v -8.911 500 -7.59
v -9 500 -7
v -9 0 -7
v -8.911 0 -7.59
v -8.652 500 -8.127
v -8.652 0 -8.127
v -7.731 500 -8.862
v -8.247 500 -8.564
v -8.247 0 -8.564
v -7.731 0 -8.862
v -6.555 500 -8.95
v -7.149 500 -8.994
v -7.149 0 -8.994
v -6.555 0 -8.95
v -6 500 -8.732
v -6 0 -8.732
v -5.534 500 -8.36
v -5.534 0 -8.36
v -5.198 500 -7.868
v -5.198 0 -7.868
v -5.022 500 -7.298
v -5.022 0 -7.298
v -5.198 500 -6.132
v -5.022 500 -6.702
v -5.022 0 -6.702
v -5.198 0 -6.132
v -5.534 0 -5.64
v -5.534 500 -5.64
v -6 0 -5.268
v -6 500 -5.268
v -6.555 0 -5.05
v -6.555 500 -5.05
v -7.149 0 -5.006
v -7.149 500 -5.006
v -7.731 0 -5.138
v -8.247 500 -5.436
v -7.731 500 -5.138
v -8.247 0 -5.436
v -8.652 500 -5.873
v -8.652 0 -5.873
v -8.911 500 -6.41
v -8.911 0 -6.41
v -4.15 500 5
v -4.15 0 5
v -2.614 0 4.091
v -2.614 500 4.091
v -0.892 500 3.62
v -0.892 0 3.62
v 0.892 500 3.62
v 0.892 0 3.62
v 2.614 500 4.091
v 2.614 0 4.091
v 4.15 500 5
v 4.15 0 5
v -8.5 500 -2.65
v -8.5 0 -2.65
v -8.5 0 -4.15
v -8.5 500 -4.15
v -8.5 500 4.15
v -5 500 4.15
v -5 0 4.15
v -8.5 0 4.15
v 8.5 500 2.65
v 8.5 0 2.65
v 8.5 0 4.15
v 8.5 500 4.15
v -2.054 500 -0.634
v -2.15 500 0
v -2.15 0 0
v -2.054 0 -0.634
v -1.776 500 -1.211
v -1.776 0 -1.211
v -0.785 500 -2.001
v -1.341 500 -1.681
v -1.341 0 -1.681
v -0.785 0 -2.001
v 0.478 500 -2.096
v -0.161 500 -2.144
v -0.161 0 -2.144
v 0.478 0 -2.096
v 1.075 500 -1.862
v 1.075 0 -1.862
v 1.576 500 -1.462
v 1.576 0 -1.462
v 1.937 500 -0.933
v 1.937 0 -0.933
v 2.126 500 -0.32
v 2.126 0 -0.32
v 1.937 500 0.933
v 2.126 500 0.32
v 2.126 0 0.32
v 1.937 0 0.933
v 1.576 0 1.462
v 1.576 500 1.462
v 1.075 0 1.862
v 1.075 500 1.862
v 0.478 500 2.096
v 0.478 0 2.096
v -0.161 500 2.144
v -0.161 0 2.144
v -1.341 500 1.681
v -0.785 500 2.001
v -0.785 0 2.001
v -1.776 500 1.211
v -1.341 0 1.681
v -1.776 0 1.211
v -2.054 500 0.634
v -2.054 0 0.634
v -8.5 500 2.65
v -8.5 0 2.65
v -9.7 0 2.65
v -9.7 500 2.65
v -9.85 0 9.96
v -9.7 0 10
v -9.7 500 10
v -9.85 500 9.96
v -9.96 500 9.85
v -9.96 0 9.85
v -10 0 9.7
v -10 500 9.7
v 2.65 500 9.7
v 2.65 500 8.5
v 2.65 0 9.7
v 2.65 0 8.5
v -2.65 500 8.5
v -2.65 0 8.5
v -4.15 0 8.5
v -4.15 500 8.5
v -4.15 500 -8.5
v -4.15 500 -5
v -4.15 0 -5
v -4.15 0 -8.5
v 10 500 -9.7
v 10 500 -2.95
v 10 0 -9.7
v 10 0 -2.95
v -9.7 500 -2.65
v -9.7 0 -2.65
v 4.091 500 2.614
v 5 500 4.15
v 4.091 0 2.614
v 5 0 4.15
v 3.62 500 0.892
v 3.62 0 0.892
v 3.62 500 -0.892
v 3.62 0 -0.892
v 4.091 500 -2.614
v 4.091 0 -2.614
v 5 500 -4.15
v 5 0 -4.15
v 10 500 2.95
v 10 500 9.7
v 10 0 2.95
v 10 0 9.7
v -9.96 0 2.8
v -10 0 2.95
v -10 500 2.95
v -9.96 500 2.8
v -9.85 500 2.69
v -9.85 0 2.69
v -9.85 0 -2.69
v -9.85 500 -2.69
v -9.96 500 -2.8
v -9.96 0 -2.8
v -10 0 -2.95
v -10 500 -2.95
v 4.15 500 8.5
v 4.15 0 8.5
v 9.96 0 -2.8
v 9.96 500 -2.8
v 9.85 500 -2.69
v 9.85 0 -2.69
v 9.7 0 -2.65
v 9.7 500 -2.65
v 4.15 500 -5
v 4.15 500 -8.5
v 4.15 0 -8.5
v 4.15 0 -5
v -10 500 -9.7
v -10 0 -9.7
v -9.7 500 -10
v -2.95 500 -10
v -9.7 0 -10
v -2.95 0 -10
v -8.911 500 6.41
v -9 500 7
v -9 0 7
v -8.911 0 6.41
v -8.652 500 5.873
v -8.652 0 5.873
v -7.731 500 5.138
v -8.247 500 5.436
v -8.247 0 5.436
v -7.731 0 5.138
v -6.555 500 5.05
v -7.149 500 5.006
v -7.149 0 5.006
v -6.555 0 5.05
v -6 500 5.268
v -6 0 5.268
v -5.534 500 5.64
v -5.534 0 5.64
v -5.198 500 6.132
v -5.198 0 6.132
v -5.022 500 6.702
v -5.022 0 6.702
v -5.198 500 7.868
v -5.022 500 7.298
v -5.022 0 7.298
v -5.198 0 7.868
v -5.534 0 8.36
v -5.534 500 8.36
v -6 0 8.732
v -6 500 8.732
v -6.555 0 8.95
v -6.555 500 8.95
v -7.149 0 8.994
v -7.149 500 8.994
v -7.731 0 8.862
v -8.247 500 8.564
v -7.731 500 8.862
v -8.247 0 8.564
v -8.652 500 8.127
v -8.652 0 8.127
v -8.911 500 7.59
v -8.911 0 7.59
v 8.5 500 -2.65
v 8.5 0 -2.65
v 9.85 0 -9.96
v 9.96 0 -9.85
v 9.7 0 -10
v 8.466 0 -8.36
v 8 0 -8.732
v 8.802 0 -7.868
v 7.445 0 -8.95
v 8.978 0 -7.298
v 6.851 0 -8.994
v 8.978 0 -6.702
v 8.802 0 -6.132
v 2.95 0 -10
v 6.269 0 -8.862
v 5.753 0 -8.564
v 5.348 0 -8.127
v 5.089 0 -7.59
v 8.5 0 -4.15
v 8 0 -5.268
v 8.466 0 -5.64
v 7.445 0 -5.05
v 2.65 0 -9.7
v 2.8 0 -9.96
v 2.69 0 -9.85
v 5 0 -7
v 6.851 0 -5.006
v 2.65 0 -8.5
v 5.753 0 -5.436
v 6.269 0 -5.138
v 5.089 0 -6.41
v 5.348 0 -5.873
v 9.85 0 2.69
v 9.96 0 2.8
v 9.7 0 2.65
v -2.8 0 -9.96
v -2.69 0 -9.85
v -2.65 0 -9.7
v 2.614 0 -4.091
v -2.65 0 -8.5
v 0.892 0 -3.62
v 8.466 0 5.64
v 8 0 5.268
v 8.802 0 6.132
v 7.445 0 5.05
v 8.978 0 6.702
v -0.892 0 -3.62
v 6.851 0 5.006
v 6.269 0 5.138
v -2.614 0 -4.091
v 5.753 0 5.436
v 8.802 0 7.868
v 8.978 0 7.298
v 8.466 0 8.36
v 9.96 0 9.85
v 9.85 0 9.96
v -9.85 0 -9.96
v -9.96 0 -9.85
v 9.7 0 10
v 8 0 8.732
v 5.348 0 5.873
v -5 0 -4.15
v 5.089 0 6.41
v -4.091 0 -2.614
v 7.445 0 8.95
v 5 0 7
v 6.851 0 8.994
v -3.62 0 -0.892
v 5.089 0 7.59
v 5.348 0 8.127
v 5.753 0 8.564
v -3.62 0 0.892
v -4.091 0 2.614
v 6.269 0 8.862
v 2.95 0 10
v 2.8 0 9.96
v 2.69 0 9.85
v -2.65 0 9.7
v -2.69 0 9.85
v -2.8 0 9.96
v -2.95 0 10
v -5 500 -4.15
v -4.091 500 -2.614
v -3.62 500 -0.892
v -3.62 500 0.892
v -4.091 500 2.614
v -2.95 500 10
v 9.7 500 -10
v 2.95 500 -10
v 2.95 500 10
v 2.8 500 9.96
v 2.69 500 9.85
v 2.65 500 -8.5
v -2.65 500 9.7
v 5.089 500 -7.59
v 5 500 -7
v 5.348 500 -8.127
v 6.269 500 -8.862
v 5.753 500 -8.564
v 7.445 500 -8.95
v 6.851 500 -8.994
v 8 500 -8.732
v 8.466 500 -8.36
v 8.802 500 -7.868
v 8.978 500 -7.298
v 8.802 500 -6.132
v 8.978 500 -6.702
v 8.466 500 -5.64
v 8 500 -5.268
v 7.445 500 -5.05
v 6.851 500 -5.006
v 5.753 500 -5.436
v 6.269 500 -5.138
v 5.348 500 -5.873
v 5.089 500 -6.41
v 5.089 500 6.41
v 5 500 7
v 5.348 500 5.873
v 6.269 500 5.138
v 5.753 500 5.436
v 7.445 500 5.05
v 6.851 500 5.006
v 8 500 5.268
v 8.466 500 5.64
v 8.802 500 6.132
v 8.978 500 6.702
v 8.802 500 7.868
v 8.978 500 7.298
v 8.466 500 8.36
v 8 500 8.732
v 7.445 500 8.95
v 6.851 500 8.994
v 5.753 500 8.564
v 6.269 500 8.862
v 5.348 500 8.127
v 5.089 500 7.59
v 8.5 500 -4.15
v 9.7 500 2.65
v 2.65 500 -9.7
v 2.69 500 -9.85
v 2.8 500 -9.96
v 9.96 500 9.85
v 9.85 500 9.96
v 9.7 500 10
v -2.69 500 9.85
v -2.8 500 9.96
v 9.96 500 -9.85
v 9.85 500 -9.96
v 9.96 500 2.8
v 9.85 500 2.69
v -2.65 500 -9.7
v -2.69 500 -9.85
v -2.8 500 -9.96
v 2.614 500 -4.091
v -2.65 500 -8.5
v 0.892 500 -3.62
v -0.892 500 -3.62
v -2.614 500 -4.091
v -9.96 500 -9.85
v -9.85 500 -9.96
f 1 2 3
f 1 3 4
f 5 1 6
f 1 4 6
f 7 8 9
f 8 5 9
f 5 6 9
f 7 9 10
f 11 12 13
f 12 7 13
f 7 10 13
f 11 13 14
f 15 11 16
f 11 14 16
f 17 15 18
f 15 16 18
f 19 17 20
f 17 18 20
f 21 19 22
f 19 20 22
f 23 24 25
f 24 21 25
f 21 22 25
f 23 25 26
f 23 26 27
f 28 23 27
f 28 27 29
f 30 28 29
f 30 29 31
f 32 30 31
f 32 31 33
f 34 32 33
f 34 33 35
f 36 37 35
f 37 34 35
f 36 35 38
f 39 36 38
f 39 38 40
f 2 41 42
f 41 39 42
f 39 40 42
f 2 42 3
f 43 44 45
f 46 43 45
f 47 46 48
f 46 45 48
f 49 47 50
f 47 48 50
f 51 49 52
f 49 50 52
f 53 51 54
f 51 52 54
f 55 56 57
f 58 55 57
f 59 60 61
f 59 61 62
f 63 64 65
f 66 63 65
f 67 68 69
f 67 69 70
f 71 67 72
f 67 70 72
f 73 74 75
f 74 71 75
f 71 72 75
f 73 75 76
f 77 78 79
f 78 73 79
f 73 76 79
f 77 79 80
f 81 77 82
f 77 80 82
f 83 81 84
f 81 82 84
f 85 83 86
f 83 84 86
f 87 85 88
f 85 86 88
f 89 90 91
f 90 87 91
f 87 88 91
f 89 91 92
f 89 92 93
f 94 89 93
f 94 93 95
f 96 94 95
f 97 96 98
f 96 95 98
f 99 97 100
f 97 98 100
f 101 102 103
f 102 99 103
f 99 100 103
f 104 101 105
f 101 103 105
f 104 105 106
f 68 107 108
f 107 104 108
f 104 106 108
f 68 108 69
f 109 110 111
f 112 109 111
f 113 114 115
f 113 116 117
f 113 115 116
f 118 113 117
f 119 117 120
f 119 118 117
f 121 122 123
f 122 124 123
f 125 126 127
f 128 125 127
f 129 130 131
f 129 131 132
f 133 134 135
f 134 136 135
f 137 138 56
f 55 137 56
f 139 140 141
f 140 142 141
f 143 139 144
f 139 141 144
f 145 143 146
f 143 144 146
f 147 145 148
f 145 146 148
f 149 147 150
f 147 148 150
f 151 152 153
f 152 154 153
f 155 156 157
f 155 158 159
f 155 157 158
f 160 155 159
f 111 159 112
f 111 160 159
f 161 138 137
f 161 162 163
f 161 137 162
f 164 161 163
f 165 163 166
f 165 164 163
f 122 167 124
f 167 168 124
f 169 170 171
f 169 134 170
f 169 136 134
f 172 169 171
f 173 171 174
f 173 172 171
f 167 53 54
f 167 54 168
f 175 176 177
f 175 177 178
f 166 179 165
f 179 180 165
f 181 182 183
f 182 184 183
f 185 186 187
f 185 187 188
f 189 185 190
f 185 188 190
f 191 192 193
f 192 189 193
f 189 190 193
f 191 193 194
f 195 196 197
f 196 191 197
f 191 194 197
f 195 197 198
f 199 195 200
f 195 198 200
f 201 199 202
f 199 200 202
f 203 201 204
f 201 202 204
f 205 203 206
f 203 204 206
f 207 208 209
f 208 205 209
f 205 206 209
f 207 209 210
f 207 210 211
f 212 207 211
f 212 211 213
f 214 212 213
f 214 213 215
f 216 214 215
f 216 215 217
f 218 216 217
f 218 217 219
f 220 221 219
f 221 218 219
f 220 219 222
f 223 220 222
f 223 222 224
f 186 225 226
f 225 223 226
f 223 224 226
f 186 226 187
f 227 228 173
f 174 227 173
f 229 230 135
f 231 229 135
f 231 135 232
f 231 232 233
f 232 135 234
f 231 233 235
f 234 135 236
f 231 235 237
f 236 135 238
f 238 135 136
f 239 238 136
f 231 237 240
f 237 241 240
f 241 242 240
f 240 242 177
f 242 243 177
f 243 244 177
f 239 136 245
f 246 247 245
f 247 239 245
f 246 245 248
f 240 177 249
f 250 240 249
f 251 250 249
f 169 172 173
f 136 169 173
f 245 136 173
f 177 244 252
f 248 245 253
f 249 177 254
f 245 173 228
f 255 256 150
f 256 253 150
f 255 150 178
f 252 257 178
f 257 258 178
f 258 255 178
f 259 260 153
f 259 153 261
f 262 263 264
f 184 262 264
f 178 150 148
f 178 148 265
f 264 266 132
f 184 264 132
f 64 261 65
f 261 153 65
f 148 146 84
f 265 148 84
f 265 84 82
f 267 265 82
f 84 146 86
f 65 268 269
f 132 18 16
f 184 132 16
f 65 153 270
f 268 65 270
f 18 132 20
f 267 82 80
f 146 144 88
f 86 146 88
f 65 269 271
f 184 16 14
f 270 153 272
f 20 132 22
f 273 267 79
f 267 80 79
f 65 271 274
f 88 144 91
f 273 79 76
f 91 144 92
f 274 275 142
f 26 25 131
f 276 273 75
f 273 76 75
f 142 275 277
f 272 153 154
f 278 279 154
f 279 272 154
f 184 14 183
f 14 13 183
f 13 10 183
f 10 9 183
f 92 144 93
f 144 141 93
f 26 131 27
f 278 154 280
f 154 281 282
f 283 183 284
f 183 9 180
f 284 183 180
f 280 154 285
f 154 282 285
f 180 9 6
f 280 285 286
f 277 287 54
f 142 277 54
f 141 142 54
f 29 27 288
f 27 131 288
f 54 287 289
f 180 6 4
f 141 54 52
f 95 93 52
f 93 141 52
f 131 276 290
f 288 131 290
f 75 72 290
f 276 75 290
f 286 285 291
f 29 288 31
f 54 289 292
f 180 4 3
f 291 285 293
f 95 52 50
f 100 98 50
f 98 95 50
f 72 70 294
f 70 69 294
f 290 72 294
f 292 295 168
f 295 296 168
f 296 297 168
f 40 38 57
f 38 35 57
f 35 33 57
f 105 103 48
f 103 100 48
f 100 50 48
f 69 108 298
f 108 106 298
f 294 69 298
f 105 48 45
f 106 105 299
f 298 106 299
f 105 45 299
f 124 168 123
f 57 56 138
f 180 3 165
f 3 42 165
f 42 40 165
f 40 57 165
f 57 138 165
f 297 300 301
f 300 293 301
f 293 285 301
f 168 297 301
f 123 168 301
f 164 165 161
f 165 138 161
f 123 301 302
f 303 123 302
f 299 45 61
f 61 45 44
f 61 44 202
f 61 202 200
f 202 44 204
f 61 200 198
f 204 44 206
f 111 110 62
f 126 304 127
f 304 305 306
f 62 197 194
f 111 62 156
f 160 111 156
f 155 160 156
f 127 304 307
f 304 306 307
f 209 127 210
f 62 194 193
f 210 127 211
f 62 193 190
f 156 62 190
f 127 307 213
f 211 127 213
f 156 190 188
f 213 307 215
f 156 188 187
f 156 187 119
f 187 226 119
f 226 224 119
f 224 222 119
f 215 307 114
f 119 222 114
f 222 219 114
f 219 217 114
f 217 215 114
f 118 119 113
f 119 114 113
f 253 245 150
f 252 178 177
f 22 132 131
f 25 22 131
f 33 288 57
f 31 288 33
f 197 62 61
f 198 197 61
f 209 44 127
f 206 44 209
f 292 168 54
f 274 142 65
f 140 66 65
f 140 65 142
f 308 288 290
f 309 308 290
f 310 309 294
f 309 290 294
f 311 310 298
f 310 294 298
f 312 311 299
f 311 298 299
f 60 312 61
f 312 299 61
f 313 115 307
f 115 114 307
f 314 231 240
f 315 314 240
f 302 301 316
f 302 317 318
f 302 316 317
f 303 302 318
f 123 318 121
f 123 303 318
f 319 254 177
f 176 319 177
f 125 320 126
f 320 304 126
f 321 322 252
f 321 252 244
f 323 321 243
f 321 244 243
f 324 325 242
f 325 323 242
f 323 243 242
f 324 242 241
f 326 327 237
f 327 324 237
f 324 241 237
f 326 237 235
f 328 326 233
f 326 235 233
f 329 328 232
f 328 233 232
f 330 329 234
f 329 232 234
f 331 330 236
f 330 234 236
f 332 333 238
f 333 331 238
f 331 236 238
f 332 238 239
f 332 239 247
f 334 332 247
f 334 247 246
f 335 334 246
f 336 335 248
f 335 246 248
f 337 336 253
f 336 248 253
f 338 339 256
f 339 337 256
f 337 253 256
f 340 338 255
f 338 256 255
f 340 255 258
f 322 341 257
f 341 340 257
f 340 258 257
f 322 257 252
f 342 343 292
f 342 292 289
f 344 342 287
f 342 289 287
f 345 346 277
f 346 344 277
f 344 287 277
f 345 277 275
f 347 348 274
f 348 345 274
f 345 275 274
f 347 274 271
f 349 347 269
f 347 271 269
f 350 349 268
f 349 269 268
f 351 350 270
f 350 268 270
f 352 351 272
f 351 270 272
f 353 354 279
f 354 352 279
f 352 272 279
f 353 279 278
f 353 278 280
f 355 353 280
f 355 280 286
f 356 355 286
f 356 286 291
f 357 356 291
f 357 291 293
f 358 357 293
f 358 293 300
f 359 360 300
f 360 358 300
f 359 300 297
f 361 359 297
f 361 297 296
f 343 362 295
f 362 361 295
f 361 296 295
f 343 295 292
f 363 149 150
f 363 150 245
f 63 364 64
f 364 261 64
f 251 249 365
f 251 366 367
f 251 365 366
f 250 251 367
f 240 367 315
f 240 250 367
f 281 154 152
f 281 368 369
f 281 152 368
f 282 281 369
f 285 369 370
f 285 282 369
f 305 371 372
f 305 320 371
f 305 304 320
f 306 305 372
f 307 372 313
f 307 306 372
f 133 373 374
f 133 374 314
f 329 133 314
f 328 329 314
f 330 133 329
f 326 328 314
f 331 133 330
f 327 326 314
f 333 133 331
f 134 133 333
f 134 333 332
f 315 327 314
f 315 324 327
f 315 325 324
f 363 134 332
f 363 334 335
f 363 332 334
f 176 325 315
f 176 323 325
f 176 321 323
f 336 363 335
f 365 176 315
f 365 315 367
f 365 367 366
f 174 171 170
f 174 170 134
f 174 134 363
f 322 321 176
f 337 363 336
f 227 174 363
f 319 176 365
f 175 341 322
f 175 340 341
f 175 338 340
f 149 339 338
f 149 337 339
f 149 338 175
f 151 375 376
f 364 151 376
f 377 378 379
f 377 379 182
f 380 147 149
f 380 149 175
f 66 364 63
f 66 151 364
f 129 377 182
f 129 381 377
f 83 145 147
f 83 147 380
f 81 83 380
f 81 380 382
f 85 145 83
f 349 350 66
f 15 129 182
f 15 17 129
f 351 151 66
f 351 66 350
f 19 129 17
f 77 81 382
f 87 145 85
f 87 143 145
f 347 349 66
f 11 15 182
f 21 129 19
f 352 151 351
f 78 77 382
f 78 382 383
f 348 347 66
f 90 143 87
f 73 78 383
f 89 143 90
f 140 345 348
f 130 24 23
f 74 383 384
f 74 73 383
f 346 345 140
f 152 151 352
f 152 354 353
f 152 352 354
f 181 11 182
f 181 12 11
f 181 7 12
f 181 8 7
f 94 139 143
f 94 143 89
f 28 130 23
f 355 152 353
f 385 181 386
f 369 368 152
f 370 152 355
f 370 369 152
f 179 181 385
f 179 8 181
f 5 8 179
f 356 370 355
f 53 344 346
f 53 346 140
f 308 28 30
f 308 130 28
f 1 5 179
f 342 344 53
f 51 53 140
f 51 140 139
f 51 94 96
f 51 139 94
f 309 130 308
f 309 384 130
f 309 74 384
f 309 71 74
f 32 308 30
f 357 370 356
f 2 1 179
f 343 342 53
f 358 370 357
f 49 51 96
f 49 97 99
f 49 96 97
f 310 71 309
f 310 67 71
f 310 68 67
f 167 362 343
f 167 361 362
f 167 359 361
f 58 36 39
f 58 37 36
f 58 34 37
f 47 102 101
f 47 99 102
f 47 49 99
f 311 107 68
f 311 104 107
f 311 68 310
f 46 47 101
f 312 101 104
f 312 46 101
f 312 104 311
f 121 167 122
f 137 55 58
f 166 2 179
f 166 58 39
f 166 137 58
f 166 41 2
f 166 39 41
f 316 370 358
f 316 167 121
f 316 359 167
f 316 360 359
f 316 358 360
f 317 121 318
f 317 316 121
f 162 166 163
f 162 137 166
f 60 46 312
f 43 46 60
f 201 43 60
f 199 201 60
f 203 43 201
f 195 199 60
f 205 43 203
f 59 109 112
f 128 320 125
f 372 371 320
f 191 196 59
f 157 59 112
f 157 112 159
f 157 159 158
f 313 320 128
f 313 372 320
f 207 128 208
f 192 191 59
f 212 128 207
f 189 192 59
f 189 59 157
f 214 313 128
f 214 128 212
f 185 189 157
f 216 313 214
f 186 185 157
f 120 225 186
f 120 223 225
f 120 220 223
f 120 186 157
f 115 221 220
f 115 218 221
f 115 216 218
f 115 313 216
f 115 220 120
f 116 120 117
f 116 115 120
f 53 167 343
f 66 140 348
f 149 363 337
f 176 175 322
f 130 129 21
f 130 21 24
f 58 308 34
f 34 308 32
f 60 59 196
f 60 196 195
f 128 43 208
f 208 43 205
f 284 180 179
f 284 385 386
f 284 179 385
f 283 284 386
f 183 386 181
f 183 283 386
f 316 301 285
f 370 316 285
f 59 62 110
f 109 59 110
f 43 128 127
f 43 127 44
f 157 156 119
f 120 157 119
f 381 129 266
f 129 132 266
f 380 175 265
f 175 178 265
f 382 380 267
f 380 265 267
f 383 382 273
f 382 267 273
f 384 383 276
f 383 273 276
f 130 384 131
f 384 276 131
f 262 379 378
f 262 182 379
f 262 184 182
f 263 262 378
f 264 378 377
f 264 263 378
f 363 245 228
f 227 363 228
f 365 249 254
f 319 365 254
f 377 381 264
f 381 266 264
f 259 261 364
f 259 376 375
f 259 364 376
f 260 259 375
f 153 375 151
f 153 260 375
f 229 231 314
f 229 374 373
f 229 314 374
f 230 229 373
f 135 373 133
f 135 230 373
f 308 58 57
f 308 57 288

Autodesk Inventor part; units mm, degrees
ref_plane "YZ Plane" through (0, 0, 0) normal (1, 0, 0) x (0, 1, 0)
ref_plane "XZ Plane" through (0, 0, 0) normal (0, 1, 0) x (-1, 0, 0)
ref_plane "XY Plane" through (0, 0, 0) normal (0, 0, 1) x (1, 0, 0)
sketch "스케치1" plane through (0, 0, 0) normal (0, 1, 0) x (-1, 0, 0)
  circle A0 centre (-26.5671, -74.7948) radius 2.15 projected
  circle A1 centre (-19.5671, -81.7948) radius 2 projected
  circle A2 centre (-19.5671, -67.7948) radius 2 projected
  circle A3 centre (-33.5671, -67.7948) radius 2 projected
  circle A4 centre (-33.5671, -81.7948) radius 2 projected
  arc A5 (-29.2171, -65.0948) -> (-29.5171, -64.7948) centre (-29.5171, -65.0948) ccw projected
  line L0 (-29.5171, -64.7948) -> (-36.2671, -64.7948) projected
  arc A6 (-36.2671, -64.7948) -> (-36.5671, -65.0948) centre (-36.2671, -65.0948) ccw projected
  line L1 (-36.5671, -65.0948) -> (-36.5671, -71.8448) projected
  arc A7 (-36.5671, -71.8448) -> (-36.2671, -72.1448) centre (-36.2671, -71.8448) ccw projected
  line L2 (-36.2671, -72.1448) -> (-35.0671, -72.1448) projected
  line L3 (-35.0671, -72.1448) -> (-35.0671, -70.6448) projected
  line L4 (-35.0671, -70.6448) -> (-31.5671, -70.6448) projected
  arc A8 (-31.5671, -78.9448) -> (-31.5671, -70.6448) centre (-36.8271, -74.7948) ccw projected
  line L5 (-31.5671, -78.9448) -> (-35.0671, -78.9448) projected
  line L6 (-35.0671, -78.9448) -> (-35.0671, -77.4448) projected
  line L7 (-35.0671, -77.4448) -> (-36.2671, -77.4448) projected
  arc A9 (-36.2671, -77.4448) -> (-36.5671, -77.7448) centre (-36.2671, -77.7448) ccw projected
  line L8 (-36.5671, -77.7448) -> (-36.5671, -84.4948) projected
  arc A10 (-36.5671, -84.4948) -> (-36.2671, -84.7948) centre (-36.2671, -84.4948) ccw projected
  line L9 (-36.2671, -84.7948) -> (-29.5171, -84.7948) projected
  arc A11 (-29.5171, -84.7948) -> (-29.2171, -84.4948) centre (-29.5171, -84.4948) ccw projected
  line L10 (-29.2171, -84.4948) -> (-29.2171, -83.2948) projected
  line L11 (-29.2171, -83.2948) -> (-30.7171, -83.2948) projected
  line L12 (-30.7171, -83.2948) -> (-30.7171, -79.7948) projected
  arc A12 (-22.4171, -79.7948) -> (-30.7171, -79.7948) centre (-26.5671, -85.0548) ccw projected
  line L13 (-22.4171, -79.7948) -> (-22.4171, -83.2948) projected
  line L14 (-22.4171, -83.2948) -> (-23.9171, -83.2948) projected
  line L15 (-23.9171, -83.2948) -> (-23.9171, -84.4948) projected
  arc A13 (-23.9171, -84.4948) -> (-23.6171, -84.7948) centre (-23.6171, -84.4948) ccw projected
  line L16 (-23.6171, -84.7948) -> (-16.8671, -84.7948) projected
  arc A14 (-16.8671, -84.7948) -> (-16.5671, -84.4948) centre (-16.8671, -84.4948) ccw projected
  line L17 (-16.5671, -84.4948) -> (-16.5671, -77.7448) projected
  arc A15 (-16.5671, -77.7448) -> (-16.8671, -77.4448) centre (-16.8671, -77.7448) ccw projected
  line L18 (-16.8671, -77.4448) -> (-18.0671, -77.4448) projected
  line L19 (-18.0671, -77.4448) -> (-18.0671, -78.9448) projected
  line L20 (-18.0671, -78.9448) -> (-21.5671, -78.9448) projected
  arc A16 (-21.5671, -70.6448) -> (-21.5671, -78.9448) centre (-16.3071, -74.7948) ccw projected
  line L21 (-21.5671, -70.6448) -> (-18.0671, -70.6448) projected
  line L22 (-18.0671, -70.6448) -> (-18.0671, -72.1448) projected
  line L23 (-18.0671, -72.1448) -> (-16.8671, -72.1448) projected
  arc A17 (-16.8671, -72.1448) -> (-16.5671, -71.8448) centre (-16.8671, -71.8448) ccw projected
  line L24 (-16.5671, -71.8448) -> (-16.5671, -65.0948) projected
  arc A18 (-16.5671, -65.0948) -> (-16.8671, -64.7948) centre (-16.8671, -65.0948) ccw projected
  line L25 (-16.8671, -64.7948) -> (-23.6171, -64.7948) projected
  arc A19 (-23.6171, -64.7948) -> (-23.9171, -65.0948) centre (-23.6171, -65.0948) ccw projected
  line L26 (-23.9171, -65.0948) -> (-23.9171, -66.2948) projected
  line L27 (-23.9171, -66.2948) -> (-22.4171, -66.2948) projected
  line L28 (-22.4171, -66.2948) -> (-22.4171, -69.7948) projected
  arc A20 (-30.7171, -69.7948) -> (-22.4171, -69.7948) centre (-26.5671, -64.5348) ccw projected
  line L29 (-30.7171, -69.7948) -> (-30.7171, -66.2948) projected
  line L30 (-30.7171, -66.2948) -> (-29.2171, -66.2948) projected
  line L31 (-29.2171, -66.2948) -> (-29.2171, -65.0948) projected
  circle A21 centre (0, 0) radius 2.15
  circle A22 centre (7, -7) radius 2
  circle A23 centre (7, 7) radius 2
  circle A24 centre (-7, 7) radius 2
  circle A25 centre (-7, -7) radius 2
  arc A26 (-2.65, 9.7) -> (-2.95, 10) centre (-2.95, 9.7) ccw
  line L32 (-2.95, 10) -> (-9.7, 10)
  arc A27 (-9.7, 10) -> (-10, 9.7) centre (-9.7, 9.7) ccw
  line L33 (-10, 9.7) -> (-10, 2.95)
  arc A28 (-10, 2.95) -> (-9.7, 2.65) centre (-9.7, 2.95) ccw
  line L34 (-9.7, 2.65) -> (-8.5, 2.65)
  line L35 (-8.5, 2.65) -> (-8.5, 4.15)
  line L36 (-8.5, 4.15) -> (-5, 4.15)
  arc A29 (-5, -4.15) -> (-5, 4.15) centre (-10.26, 0) ccw
  line L37 (-5, -4.15) -> (-8.5, -4.15)
  line L38 (-8.5, -4.15) -> (-8.5, -2.65)
  line L39 (-8.5, -2.65) -> (-9.7, -2.65)
  arc A30 (-9.7, -2.65) -> (-10, -2.95) centre (-9.7, -2.95) ccw
  line L40 (-10, -2.95) -> (-10, -9.7)
  arc A31 (-10, -9.7) -> (-9.7, -10) centre (-9.7, -9.7) ccw
  line L41 (-9.7, -10) -> (-2.95, -10)
  arc A32 (-2.95, -10) -> (-2.65, -9.7) centre (-2.95, -9.7) ccw
  line L42 (-2.65, -9.7) -> (-2.65, -8.5)
  line L43 (-2.65, -8.5) -> (-4.15, -8.5)
  line L44 (-4.15, -8.5) -> (-4.15, -5)
  arc A33 (4.15, -5) -> (-4.15, -5) centre (0, -10.26) ccw
  line L45 (4.15, -5) -> (4.15, -8.5)
  line L46 (4.15, -8.5) -> (2.65, -8.5)
  line L47 (2.65, -8.5) -> (2.65, -9.7)
  arc A34 (2.65, -9.7) -> (2.95, -10) centre (2.95, -9.7) ccw
  line L48 (2.95, -10) -> (9.7, -10)
  arc A35 (9.7, -10) -> (10, -9.7) centre (9.7, -9.7) ccw
  line L49 (10, -9.7) -> (10, -2.95)
  arc A36 (10, -2.95) -> (9.7, -2.65) centre (9.7, -2.95) ccw
  line L50 (9.7, -2.65) -> (8.5, -2.65)
  line L51 (8.5, -2.65) -> (8.5, -4.15)
  line L52 (8.5, -4.15) -> (5, -4.15)
  arc A37 (5, 4.15) -> (5, -4.15) centre (10.26, 0) ccw
  line L53 (5, 4.15) -> (8.5, 4.15)
  line L54 (8.5, 4.15) -> (8.5, 2.65)
  line L55 (8.5, 2.65) -> (9.7, 2.65)
  arc A38 (9.7, 2.65) -> (10, 2.95) centre (9.7, 2.95) ccw
  line L56 (10, 2.95) -> (10, 9.7)
  arc A39 (10, 9.7) -> (9.7, 10) centre (9.7, 9.7) ccw
  line L57 (9.7, 10) -> (2.95, 10)
  arc A40 (2.95, 10) -> (2.65, 9.7) centre (2.95, 9.7) ccw
  line L58 (2.65, 9.7) -> (2.65, 8.5)
  line L59 (2.65, 8.5) -> (4.15, 8.5)
  line L60 (4.15, 8.5) -> (4.15, 5)
  arc A41 (-4.15, 5) -> (4.15, 5) centre (0, 10.26) ccw
  line L61 (-4.15, 5) -> (-4.15, 8.5)
  line L62 (-4.15, 8.5) -> (-2.65, 8.5)
  line L63 (-2.65, 8.5) -> (-2.65, 9.7)
extrude "돌출1" add sketch "스케치1" along normal blind 500 contours L63 L62 L61 A41 L60 L59 L58 A40 L57 A39 L56 A38 L55 L54 L53 A37 L52 L51 L50 A36 L49 A35 L48 A34 L47 L46 L45 A33 L44 L43 L42 A32 L41 A31 L40 A30 L39 L38 L37 A29 L36 L35 L34 A28 L33 A27 L32 A26
properties part number "Propile_202050" material "알루미늄 6061"
